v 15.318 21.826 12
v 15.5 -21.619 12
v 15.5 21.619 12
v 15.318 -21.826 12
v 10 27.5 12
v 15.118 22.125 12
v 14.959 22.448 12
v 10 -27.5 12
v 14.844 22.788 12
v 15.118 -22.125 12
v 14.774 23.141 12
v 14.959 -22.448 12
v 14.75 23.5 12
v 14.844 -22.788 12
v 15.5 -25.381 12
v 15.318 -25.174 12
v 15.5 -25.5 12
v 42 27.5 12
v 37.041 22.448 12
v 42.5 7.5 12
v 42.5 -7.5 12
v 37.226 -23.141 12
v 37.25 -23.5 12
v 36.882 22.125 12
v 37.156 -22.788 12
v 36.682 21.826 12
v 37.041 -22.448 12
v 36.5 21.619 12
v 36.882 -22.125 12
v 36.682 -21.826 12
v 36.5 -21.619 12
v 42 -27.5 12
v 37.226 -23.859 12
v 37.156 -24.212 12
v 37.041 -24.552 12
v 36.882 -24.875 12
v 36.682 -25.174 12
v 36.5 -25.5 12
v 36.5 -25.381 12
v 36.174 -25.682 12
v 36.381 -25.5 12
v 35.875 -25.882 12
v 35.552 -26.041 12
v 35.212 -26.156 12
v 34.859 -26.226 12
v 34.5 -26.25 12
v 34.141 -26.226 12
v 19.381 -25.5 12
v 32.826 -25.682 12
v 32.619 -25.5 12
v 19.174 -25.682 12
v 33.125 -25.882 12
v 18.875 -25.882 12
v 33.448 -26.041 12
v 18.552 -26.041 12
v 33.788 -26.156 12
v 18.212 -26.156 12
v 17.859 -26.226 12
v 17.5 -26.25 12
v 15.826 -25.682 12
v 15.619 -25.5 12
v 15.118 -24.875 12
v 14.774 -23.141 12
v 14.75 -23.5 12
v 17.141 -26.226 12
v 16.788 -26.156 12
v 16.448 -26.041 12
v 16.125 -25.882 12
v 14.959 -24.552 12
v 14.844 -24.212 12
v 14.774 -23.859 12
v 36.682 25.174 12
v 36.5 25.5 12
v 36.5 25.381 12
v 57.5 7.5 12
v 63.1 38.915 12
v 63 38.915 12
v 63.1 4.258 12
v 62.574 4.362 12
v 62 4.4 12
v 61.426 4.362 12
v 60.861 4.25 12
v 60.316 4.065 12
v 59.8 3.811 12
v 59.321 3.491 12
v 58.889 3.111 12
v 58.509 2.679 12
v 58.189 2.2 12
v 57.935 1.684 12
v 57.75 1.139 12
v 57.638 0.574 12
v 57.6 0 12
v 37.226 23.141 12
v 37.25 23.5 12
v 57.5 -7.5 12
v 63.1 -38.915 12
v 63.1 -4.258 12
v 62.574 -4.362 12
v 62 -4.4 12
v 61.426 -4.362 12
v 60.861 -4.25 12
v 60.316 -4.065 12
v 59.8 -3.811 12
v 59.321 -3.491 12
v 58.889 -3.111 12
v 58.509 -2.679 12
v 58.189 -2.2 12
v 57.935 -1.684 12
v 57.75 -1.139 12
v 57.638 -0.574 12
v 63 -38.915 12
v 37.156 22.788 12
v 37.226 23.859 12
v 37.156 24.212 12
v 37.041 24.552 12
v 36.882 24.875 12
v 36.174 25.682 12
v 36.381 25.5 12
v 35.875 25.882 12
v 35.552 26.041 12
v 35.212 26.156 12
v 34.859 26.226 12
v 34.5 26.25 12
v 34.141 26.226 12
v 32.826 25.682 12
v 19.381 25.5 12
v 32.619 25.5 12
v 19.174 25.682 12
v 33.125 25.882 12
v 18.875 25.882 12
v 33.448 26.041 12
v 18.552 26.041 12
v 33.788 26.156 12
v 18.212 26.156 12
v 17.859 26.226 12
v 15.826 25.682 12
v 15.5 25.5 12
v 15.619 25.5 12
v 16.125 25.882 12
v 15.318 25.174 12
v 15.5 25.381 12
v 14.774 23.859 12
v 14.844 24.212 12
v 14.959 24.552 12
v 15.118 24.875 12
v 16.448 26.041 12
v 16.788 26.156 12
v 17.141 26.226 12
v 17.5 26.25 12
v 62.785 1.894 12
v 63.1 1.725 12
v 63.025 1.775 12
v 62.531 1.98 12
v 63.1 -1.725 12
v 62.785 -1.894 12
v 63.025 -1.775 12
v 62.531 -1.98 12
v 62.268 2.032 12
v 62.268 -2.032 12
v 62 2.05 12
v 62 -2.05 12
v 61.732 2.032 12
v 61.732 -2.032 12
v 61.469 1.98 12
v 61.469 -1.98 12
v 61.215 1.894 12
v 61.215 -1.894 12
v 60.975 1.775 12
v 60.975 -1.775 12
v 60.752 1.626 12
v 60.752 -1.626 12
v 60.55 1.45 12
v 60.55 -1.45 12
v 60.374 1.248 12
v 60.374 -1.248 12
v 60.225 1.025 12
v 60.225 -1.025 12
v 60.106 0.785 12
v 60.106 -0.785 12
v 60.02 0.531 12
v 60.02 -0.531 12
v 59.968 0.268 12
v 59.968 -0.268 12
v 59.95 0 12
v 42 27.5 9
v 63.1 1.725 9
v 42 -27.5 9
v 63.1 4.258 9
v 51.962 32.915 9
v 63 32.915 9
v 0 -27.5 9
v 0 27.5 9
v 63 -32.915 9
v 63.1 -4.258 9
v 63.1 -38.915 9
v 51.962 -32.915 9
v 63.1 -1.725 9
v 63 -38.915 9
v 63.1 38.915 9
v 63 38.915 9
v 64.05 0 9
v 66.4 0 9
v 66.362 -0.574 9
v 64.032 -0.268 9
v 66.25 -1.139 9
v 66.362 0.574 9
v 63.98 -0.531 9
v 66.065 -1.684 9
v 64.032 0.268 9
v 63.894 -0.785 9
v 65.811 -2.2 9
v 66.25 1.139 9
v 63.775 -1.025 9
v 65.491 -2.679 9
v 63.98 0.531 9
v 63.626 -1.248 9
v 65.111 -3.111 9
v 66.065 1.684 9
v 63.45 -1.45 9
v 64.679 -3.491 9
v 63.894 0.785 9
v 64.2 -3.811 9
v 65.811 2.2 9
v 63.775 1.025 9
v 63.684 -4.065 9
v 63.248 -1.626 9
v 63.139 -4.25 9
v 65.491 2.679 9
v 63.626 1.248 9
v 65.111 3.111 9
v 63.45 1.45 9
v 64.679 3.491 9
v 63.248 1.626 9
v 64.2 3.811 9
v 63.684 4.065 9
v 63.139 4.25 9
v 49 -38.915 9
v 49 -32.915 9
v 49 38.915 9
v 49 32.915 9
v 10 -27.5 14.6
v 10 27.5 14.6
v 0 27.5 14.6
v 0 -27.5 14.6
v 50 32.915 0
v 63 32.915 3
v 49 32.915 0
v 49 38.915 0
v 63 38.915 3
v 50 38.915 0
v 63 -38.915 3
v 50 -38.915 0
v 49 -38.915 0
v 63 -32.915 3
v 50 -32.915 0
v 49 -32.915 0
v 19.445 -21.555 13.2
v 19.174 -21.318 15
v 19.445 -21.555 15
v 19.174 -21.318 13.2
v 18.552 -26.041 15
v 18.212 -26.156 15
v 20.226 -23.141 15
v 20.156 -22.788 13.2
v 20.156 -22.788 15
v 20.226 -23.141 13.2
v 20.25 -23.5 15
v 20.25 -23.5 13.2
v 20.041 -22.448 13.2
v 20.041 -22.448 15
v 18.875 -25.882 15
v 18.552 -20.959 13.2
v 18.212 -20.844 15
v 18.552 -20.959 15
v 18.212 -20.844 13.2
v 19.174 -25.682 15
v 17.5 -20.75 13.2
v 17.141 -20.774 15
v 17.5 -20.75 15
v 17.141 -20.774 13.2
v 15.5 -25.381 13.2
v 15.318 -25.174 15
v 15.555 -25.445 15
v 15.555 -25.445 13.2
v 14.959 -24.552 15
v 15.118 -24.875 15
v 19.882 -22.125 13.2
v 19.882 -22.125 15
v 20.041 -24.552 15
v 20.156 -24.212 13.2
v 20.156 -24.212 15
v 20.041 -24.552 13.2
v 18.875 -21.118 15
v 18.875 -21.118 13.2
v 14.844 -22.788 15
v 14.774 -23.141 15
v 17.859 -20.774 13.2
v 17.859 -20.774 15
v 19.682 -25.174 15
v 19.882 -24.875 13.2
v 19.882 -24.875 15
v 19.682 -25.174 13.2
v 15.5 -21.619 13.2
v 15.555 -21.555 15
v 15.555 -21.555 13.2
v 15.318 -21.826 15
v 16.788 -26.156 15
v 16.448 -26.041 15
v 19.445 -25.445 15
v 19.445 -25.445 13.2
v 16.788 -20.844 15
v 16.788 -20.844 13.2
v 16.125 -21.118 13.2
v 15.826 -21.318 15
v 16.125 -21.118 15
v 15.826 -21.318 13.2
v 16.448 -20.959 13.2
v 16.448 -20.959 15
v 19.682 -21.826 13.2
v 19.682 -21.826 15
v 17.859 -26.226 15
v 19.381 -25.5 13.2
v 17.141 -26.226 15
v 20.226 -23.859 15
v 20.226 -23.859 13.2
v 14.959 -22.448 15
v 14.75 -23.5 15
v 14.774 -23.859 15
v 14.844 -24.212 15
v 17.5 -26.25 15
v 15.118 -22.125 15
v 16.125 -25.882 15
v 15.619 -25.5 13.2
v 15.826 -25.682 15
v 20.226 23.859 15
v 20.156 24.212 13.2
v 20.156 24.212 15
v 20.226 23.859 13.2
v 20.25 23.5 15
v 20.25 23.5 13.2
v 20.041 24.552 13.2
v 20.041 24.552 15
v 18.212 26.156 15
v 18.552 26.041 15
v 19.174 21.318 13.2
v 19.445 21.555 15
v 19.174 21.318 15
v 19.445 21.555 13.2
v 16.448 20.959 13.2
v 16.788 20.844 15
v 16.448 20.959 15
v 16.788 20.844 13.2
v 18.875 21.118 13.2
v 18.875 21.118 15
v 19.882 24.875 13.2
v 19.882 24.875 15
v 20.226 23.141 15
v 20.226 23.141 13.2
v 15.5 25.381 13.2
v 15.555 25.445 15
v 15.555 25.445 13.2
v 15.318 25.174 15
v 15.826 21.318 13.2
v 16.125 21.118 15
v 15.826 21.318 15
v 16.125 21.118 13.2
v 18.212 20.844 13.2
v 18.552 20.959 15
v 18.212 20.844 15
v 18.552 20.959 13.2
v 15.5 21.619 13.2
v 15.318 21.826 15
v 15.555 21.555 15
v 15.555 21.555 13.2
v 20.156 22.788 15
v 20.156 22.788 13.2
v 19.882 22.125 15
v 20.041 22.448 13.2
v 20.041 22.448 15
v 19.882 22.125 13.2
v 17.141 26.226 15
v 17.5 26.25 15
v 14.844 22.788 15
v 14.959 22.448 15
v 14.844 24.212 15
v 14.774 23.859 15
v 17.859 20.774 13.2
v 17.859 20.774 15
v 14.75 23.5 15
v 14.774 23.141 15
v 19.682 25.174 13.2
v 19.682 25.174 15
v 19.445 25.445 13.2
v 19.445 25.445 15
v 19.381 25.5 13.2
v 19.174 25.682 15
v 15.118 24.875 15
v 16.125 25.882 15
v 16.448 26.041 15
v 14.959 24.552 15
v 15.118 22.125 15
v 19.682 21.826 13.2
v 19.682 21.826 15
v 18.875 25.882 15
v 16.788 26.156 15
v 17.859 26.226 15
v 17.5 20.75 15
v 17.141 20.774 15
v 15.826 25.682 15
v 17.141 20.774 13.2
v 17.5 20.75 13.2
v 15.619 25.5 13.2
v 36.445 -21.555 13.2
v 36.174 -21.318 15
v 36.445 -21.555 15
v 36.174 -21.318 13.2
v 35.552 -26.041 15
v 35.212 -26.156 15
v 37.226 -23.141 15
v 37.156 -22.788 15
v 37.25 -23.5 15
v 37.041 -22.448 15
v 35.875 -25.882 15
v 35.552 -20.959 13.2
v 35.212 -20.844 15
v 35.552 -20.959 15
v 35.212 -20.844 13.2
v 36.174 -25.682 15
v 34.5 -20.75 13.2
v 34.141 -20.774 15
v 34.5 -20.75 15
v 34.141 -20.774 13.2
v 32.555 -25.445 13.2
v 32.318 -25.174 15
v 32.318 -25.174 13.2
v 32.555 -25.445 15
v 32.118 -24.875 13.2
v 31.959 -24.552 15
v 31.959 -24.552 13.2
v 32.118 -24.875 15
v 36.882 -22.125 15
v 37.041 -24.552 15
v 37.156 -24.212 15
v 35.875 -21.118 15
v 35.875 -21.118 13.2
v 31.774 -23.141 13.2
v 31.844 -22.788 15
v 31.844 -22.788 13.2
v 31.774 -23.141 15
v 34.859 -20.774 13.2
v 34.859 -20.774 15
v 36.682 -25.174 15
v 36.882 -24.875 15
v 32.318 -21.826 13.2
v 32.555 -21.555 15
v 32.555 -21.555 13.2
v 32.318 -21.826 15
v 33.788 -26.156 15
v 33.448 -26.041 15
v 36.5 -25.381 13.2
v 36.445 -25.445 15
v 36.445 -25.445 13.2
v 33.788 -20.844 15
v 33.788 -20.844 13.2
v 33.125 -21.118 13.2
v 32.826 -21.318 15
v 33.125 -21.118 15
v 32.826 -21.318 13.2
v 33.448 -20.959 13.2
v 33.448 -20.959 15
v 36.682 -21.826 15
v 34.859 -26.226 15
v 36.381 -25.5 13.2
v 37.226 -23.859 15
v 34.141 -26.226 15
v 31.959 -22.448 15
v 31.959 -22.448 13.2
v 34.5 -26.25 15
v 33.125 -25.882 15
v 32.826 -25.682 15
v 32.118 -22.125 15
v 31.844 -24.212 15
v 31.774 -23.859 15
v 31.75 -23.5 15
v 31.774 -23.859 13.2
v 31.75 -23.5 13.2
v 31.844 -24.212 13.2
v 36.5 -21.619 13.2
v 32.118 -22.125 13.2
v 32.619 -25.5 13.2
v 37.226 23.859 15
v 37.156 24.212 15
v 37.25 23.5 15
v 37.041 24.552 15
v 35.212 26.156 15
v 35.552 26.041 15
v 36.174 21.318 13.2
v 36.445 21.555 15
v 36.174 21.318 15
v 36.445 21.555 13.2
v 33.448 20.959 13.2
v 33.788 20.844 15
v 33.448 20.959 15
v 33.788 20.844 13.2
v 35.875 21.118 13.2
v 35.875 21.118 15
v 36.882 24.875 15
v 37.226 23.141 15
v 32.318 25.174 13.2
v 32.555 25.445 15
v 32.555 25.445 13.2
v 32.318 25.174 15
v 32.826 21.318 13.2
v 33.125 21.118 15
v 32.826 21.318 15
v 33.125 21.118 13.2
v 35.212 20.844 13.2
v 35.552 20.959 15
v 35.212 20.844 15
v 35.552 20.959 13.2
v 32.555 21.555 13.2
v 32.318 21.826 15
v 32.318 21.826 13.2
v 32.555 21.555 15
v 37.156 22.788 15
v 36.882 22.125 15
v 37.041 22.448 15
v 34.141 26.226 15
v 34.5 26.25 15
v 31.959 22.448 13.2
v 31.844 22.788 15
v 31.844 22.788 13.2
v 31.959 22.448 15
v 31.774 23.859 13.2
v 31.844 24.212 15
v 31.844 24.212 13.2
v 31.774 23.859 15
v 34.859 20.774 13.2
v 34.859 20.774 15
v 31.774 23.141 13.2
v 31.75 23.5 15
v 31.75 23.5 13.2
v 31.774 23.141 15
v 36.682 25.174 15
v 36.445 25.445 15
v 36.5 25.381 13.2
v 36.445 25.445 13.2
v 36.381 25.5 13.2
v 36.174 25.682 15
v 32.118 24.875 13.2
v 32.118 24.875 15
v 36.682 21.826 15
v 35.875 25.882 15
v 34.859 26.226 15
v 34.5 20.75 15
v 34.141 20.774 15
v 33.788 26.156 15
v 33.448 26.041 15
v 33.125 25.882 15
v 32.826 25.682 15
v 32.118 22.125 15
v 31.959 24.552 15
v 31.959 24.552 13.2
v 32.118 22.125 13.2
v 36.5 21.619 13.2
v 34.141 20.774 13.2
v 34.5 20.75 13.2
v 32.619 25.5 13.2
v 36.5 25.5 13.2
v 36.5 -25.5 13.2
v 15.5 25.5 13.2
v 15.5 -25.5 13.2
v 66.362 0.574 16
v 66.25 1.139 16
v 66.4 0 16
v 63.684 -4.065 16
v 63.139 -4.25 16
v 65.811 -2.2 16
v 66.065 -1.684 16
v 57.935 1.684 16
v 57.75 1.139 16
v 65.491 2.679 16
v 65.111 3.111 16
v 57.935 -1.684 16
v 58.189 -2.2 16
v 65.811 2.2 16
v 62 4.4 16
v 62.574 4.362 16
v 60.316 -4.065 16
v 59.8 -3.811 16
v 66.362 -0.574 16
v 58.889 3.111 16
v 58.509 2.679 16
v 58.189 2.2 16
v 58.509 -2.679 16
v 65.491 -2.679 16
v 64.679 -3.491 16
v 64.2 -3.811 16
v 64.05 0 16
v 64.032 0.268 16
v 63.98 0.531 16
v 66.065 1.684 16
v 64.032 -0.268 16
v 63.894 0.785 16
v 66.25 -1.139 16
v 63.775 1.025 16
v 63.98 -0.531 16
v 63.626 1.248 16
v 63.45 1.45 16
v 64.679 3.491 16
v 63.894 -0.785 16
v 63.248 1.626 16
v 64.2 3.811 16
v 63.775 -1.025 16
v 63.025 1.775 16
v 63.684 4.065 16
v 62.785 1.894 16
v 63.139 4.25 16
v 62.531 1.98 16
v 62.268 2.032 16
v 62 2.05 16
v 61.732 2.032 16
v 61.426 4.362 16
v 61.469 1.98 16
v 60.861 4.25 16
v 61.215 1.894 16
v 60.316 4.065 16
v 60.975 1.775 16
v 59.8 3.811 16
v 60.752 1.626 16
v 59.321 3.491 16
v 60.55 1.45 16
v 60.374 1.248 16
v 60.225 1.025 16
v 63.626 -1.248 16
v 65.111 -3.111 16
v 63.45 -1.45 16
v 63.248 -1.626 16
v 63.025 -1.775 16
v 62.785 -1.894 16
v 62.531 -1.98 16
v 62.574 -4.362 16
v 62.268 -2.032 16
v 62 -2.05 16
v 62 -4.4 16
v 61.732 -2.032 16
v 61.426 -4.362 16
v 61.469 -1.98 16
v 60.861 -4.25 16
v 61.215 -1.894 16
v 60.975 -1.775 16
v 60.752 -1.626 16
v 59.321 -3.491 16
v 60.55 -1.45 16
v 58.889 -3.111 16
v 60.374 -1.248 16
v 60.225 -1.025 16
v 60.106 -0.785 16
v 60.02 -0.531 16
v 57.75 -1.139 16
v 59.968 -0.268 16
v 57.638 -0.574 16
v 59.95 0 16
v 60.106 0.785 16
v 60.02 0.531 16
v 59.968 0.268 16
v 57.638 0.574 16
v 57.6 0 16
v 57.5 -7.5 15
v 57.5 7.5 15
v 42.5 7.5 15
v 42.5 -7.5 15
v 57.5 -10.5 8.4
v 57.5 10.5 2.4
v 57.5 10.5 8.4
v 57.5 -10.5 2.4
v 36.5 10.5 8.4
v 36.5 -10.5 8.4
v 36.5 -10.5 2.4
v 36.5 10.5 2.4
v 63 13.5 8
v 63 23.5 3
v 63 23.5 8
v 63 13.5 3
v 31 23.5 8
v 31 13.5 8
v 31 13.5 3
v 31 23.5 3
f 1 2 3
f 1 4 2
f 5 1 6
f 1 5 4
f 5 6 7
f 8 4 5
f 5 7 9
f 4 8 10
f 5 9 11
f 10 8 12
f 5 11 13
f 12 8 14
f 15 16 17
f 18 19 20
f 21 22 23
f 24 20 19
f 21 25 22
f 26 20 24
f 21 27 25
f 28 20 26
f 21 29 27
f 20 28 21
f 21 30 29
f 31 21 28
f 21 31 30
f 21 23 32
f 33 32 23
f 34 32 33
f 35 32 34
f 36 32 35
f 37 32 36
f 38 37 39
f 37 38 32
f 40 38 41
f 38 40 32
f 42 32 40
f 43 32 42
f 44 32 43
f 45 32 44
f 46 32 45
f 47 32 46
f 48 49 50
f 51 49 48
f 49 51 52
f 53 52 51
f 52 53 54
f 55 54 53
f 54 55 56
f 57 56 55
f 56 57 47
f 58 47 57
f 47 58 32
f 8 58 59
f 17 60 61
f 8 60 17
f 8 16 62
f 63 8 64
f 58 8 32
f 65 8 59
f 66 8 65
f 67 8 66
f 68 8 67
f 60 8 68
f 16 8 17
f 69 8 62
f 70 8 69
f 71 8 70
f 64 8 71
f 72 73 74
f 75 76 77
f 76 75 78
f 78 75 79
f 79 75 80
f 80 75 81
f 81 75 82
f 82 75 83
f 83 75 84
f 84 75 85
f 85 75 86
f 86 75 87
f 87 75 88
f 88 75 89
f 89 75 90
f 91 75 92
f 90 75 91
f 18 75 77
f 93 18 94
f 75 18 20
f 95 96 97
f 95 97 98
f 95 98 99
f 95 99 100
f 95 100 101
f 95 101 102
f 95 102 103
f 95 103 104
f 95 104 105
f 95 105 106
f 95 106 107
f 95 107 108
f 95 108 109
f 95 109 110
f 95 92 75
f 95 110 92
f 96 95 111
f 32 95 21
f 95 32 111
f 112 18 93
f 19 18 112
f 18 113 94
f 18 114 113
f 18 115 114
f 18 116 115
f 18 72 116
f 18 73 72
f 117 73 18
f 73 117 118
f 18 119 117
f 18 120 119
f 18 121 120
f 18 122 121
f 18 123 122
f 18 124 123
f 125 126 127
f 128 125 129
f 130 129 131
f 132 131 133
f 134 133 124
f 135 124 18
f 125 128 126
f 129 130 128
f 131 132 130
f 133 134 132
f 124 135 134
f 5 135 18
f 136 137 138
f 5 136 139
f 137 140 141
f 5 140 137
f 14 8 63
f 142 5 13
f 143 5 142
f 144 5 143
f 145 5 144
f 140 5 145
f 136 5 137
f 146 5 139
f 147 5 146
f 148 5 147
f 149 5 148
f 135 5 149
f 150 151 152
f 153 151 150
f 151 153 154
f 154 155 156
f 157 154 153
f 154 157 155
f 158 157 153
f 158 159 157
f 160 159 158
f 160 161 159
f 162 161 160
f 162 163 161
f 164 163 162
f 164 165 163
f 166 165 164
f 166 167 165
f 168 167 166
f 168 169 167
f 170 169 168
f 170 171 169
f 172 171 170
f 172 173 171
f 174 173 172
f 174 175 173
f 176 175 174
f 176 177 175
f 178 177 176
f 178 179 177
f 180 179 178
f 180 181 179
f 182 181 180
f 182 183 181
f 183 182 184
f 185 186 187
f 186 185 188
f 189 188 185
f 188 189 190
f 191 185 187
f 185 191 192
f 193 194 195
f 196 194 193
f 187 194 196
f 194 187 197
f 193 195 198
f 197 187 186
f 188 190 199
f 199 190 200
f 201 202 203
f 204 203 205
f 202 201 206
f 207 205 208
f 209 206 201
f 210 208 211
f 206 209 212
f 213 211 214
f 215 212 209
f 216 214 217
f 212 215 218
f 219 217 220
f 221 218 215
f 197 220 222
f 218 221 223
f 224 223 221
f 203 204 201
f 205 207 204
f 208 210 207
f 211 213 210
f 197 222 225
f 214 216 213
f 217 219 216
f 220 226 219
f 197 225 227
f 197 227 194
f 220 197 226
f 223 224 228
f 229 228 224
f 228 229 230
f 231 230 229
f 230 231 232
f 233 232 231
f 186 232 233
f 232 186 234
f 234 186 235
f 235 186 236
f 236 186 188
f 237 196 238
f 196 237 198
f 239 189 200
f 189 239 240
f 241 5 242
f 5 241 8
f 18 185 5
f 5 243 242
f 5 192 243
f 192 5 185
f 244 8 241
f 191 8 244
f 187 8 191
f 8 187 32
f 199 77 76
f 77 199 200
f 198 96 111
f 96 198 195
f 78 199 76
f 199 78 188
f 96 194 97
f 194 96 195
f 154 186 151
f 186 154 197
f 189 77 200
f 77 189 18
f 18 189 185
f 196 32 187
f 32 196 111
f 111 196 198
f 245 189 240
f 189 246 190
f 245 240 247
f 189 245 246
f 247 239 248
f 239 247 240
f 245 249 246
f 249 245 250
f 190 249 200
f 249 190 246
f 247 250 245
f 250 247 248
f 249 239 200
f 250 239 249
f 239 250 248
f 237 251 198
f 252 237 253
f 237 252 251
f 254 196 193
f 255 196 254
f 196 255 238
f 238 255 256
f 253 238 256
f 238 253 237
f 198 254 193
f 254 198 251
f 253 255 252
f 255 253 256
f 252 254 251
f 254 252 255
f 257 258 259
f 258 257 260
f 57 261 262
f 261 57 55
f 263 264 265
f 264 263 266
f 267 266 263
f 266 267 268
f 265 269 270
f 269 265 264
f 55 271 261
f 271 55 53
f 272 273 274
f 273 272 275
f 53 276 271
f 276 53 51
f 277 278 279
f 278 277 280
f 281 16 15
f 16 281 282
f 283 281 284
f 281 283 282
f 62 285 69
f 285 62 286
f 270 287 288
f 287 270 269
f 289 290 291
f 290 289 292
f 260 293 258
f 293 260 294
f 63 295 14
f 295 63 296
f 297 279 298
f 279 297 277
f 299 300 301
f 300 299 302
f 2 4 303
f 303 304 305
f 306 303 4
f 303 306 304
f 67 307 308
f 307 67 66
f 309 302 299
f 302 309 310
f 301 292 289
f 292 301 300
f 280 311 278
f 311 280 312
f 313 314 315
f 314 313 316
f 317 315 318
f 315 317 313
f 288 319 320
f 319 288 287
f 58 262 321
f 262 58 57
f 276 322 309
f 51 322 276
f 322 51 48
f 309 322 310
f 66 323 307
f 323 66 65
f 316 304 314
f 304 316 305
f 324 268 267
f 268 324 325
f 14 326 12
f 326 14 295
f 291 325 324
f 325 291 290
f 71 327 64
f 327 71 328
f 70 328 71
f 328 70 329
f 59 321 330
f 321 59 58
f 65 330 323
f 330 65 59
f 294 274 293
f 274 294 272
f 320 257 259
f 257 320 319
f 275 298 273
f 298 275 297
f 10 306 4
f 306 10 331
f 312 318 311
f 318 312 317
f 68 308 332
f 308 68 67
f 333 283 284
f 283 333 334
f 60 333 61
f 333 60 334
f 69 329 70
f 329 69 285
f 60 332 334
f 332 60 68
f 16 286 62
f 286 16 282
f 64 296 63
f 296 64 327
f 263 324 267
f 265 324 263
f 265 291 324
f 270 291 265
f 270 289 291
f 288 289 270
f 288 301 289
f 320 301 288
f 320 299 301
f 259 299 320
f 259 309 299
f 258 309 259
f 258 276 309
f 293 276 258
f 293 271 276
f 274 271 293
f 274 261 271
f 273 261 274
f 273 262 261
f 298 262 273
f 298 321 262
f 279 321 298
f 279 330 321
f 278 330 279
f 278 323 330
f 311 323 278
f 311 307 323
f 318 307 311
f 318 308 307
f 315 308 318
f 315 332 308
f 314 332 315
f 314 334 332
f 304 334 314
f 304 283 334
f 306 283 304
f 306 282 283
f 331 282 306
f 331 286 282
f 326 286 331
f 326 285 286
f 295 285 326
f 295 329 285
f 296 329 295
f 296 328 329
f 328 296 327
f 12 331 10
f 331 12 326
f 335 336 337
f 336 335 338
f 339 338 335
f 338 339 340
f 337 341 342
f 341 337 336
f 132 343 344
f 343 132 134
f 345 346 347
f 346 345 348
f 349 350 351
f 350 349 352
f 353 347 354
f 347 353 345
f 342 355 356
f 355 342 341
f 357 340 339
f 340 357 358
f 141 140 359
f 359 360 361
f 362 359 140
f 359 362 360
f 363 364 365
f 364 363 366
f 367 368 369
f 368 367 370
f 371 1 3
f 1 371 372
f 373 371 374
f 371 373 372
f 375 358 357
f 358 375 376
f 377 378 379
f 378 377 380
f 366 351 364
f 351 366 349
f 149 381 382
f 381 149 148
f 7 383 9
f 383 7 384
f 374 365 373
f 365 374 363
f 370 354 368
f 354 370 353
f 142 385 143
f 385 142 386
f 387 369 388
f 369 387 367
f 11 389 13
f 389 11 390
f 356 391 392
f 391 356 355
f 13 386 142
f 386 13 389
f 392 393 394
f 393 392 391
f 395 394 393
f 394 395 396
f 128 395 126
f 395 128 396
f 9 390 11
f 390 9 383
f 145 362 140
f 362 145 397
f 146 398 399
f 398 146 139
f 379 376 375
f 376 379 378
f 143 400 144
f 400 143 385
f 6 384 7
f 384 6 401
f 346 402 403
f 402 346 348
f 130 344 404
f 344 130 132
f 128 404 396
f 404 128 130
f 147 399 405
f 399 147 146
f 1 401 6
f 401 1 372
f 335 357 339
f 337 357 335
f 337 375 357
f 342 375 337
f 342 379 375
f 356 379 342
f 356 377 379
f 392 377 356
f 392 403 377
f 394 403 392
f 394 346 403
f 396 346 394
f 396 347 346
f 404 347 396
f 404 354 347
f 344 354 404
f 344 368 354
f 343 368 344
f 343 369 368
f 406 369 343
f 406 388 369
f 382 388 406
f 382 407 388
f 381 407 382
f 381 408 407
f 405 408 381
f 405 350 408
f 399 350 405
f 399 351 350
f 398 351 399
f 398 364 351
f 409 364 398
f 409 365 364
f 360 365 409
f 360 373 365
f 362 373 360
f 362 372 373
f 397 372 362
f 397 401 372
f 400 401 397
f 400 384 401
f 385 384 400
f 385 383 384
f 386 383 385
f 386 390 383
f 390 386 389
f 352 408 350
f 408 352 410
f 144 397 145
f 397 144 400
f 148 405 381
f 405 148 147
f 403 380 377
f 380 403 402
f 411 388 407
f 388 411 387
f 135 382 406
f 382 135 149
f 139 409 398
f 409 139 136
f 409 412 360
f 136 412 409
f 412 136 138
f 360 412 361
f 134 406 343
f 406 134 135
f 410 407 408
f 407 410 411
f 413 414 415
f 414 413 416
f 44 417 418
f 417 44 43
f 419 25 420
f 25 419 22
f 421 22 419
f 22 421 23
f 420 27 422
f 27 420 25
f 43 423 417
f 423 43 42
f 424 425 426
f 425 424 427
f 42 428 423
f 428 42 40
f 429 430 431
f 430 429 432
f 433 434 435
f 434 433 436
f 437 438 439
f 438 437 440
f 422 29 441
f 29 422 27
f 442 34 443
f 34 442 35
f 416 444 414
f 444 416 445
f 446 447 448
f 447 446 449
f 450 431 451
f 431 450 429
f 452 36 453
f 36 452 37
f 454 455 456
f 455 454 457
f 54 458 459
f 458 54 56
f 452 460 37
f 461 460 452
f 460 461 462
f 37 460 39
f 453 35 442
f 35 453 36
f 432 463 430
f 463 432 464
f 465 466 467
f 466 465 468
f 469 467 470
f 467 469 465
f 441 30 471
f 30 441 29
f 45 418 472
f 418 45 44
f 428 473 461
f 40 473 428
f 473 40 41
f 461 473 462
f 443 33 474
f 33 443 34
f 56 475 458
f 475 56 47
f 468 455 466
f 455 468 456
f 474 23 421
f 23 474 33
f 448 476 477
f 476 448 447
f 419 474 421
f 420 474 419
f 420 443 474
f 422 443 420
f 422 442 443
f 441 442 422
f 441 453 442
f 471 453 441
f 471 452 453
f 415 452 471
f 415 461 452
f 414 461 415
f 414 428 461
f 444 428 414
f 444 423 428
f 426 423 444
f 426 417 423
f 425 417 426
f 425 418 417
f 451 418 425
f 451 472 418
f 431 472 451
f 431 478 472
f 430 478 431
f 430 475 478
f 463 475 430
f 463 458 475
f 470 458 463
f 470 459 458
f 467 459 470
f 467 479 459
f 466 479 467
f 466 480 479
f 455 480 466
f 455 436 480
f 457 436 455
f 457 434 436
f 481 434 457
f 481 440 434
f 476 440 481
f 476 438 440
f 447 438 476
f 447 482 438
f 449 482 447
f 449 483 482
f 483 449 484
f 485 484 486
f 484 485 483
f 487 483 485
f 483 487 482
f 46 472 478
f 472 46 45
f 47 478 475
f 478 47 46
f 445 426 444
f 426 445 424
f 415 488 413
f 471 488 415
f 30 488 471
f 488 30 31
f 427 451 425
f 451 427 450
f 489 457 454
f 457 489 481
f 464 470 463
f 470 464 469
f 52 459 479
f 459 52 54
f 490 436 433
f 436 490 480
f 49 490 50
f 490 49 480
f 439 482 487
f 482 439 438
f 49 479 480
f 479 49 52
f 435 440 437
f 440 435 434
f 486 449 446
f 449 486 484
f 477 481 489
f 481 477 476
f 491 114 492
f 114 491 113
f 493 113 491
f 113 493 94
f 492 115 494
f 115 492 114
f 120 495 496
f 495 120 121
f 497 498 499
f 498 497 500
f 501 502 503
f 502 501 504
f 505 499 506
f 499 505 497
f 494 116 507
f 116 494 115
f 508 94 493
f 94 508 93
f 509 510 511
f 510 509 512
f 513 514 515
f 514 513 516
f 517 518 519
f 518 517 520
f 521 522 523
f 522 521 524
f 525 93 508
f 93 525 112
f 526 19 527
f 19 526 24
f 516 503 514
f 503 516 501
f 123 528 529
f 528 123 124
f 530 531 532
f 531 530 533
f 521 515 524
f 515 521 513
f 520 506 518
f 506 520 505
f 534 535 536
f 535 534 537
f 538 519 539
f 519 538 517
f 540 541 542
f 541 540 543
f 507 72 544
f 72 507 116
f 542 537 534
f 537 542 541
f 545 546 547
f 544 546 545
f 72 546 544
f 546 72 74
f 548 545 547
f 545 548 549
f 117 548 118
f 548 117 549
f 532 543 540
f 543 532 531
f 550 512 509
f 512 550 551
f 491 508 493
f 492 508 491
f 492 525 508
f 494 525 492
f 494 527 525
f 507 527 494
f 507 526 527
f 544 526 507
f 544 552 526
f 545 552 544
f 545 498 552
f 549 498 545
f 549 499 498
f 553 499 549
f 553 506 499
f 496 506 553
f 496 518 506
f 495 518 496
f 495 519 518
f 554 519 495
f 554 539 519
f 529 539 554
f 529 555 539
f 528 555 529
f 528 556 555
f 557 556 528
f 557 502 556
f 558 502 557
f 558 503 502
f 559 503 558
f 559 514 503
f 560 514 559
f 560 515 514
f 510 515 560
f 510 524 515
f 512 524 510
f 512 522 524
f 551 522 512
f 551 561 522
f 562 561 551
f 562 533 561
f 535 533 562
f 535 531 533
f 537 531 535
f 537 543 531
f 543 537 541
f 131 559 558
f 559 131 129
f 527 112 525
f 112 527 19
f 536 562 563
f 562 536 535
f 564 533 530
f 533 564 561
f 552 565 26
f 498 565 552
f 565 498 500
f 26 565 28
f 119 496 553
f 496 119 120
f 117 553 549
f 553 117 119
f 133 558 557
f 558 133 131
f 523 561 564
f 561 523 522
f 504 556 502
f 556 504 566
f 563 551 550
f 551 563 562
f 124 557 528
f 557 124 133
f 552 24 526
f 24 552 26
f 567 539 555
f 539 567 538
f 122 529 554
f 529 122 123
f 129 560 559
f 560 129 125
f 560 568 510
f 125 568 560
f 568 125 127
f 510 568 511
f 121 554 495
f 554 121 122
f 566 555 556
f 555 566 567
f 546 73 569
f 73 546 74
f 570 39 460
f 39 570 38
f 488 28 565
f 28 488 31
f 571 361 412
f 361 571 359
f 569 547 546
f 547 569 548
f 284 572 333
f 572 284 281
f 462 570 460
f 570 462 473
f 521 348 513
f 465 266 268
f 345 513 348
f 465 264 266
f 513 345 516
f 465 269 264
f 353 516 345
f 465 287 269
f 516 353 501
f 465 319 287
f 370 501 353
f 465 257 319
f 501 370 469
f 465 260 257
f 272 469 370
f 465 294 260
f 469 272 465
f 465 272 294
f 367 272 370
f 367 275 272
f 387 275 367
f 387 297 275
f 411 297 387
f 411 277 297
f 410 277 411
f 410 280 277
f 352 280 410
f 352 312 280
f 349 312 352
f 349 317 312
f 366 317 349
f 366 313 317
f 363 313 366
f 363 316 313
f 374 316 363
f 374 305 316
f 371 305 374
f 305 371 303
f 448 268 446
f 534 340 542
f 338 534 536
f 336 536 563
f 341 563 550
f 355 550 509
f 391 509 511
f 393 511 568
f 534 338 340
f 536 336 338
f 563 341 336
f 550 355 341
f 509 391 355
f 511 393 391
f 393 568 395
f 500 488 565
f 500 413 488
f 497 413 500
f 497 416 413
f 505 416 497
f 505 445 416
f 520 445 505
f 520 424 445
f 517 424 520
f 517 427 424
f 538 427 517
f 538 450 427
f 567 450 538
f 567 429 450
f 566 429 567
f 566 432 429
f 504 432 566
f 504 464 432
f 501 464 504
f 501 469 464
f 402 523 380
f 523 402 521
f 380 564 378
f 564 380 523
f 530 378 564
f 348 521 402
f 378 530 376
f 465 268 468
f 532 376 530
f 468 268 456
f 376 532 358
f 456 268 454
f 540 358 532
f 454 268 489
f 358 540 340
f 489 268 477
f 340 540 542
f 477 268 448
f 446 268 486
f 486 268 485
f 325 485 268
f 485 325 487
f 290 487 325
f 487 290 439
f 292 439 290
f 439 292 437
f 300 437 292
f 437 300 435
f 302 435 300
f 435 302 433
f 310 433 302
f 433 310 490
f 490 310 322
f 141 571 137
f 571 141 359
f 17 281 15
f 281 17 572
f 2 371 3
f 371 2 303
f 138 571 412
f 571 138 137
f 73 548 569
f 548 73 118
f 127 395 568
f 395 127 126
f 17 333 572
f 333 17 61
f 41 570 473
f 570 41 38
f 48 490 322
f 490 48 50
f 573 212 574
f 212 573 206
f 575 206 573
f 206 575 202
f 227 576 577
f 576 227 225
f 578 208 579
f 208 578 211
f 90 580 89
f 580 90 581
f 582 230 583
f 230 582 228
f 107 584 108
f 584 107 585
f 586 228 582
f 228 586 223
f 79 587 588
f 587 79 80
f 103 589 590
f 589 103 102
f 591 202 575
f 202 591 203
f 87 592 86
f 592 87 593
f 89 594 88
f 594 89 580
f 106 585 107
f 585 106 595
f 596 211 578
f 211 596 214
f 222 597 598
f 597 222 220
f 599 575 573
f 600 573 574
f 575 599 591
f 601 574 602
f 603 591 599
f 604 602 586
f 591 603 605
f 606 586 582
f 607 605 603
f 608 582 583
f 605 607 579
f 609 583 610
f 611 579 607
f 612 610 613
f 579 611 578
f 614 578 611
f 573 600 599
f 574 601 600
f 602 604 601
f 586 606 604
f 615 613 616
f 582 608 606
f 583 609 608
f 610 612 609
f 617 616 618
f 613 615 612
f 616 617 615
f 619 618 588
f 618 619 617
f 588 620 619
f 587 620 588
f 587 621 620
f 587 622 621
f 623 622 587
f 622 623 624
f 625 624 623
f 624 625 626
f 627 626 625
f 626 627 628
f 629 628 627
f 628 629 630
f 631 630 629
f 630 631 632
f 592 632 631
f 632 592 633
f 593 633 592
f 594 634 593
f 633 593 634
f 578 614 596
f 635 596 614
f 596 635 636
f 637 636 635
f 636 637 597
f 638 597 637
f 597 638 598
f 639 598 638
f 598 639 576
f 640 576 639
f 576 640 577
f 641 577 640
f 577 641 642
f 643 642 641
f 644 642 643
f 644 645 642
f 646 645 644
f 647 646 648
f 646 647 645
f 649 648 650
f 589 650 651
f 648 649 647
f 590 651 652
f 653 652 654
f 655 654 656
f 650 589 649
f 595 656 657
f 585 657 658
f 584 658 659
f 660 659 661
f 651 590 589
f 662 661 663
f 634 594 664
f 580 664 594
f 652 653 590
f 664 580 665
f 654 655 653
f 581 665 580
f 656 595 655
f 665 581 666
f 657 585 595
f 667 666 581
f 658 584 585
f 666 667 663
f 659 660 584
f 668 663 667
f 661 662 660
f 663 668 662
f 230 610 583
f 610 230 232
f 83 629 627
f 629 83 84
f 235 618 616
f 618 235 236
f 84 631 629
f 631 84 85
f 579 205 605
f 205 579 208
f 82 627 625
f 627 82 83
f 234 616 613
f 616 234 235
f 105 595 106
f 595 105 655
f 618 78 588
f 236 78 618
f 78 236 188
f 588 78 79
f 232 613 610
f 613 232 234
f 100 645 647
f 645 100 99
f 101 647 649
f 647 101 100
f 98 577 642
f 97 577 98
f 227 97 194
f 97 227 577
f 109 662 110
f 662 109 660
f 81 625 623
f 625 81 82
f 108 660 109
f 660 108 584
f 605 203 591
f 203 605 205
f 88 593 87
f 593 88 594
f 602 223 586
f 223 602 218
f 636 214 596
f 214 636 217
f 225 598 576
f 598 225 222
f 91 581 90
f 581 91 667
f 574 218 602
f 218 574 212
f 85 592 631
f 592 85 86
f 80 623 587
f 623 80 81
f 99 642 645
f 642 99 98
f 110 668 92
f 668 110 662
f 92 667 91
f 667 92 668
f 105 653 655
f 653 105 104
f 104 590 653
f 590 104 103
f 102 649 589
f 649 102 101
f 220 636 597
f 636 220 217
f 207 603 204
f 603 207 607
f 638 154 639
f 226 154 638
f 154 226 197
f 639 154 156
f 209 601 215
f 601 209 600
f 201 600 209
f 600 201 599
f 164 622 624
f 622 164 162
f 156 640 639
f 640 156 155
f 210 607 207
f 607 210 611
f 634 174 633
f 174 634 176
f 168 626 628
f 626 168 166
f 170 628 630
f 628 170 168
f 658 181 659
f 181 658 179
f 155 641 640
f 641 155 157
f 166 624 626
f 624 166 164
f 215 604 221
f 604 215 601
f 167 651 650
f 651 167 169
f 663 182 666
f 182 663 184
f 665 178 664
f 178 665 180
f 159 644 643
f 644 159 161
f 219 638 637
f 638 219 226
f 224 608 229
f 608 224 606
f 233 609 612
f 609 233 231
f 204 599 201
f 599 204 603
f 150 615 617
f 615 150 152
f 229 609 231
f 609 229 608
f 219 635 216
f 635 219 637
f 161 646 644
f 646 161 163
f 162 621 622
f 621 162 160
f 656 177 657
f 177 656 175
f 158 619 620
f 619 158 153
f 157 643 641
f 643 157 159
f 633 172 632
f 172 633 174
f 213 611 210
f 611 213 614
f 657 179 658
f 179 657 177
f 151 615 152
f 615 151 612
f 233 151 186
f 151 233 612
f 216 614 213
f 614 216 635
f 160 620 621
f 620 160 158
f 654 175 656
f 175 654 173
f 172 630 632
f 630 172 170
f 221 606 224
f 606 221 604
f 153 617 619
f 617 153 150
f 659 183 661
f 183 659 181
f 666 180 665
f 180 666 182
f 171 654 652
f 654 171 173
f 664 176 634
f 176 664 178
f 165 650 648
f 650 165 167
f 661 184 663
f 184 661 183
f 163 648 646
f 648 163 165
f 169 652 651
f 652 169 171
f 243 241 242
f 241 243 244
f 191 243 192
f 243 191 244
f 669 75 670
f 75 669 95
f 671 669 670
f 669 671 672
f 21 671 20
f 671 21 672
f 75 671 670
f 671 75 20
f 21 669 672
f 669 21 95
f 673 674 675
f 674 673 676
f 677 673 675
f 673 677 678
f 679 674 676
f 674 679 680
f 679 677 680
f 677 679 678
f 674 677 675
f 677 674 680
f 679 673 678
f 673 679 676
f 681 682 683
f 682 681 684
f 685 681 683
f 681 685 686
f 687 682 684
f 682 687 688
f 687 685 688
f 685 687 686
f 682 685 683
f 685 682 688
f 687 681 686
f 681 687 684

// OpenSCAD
// ======================================================================
// Slot Car Track Mapper — Front Sensor Fixture (parametric, first pass)
//
// Donor chassis: Scaleauto HS-124, plastic, sidewinder, variable
// wheelbase 96-114mm. See ../DESIGN.md §7 for the full mechanical plan
// and reasoning behind every decision referenced below.
//
// Cut the donor chassis at its molded score line ("the V") in front of
// the motor box. The rear motor/drive section is kept stock and is NOT
// modeled here. This part REPLACES the front section: it splices onto
// the rear stub, carries the guide flag, the Pico 2 W, the PMW3360, the
// ICM-42688-P, and the IR reflectance lap sensor, and rides on a
// two-point skid instead of the stock front wheels.
//
// Units: mm. X=0 at the rear cut face, +X toward the front/guide flag.
// Y=0 on the car's centerline. Z=0 at the track surface.
//
// ---------------------------------------------------------------------
// STATUS: second pass. All donor-chassis dimensions below are now from
// calipers on the real part (not photo estimates). Still NOT print-ready:
// the component footprints (Pico/PMW3360/ICM-42688-P/IR module) are still
// typical/placeholder values — verify those against the actual parts
// bought before printing, and the rear_splice() joint is still a
// placeholder lap joint pending the real spine cross-section/rib profile.
// ======================================================================

// ---- MEASURED on the physical chassis (trust these) -------------------
wheelbase           = 114.25;
front_track_width   = 77.83;  // outside-to-outside, stock front wheels
rear_track_width    = 80.72;  // outside-to-outside, stock rear wheels (kept stock — informational only)
spine_width         = 55.0;   // width of the main chassis spine at the cut
cut_to_front_axle   = 47.0;   // V score-line to (former) front axle centerline
front_axle_to_guide = 18.0;   // front axle centerline to guide-flag tip
spine_thickness     = 3.6;    // stock spine plastic thickness at the cut face
guide_peg_dia       = 3.8;    // stock guide-flag pivot peg diameter
guide_peg_depth     = 7.0;    // stock guide-flag pivot peg engagement depth

// ---- Still estimated/typical — nothing left here as of the latest caliper pass,
// keep this section for whatever gets re-estimated later. ---------------

total_length = cut_to_front_axle + front_axle_to_guide;
// NOTE: the real total_length (65mm) is barely half of the ~112mm first-pass
// guess. That's tight — the Pico 2 W's 51mm length alone eats most of it if
// mounted lengthwise, which is why it's mounted ROTATED 90° below (across
// the deck's width instead of along its length).

// Lever arm from the guide-pin pivot (DESIGN.md §2) to wherever the
// optical sensor actually ends up — feed this into the fusion loop's
// lever-arm correction once it's finalized here.
pmw_x = total_length - 18;
lever_arm_r = total_length - pmw_x;

// ---- Component footprints — VERIFY against the specific parts bought --
pico_l = 51; pico_w = 21;                                  // Pico 2 W board outline
pico_hole_dx = 47; pico_hole_dy = 17; pico_hole_d = 2.5;    // mount-hole pattern (+ clearance)

pmw_l = 21; pmw_w = 21; pmw_module_h = 6;                  // PMW3360 breakout, typical (PCB+lens)
pmw_focus_height = 2.4;                                     // lens-to-surface distance, typical — shim to tune

icm_l = 15; icm_w = 15; icm_t = 3;                         // ICM-42688-P breakout, typical

ir_l = 32; ir_w = 10; ir_module_h = 5;                     // TCRT5000-style reflectance module, typical
ir_focus_height = 3.0;                                      // typical optimal sensing distance — verify vs. datasheet

// ---- Fixture structural parameters -------------------------------------
deck_t    = 3;    // main deck thickness
skid_h    = 9;    // ground clearance: track surface to underside of deck
skid_w    = 6;    // each skid pad's width (Y)
skid_len  = 14;   // each skid pad's length (X) — shrunk to fit the real (shorter) total_length
ski_tip_r = 3;    // radius rounding the skid's leading edge, so it bridges track-piece seams

standoff_pmw = skid_h - pmw_focus_height - pmw_module_h;
standoff_ir  = skid_h - ir_focus_height  - ir_module_h;

echo(str("total_length = ", total_length, " mm"));
echo(str("lever_arm_r (guide pivot to PMW3360) = ", lever_arm_r, " mm"));
echo(str("pmw standoff spacer needed = ", standoff_pmw, " mm ", standoff_pmw < 0 ? "*** NEGATIVE — increase skid_h or use a thinner module ***" : "(OK)"));
echo(str("ir standoff spacer needed = ", standoff_ir, " mm ", standoff_ir < 0 ? "*** NEGATIVE — increase skid_h or use a thinner module ***" : "(OK)"));

$fn = 48;

flare_start = 42;          // X where the deck begins widening from the spine to the skid track width
deck_front  = total_length - 2;  // X of the deck's front edge, almost at the guide-flag tip
splice_len  = 10;          // rear_splice overlap length — shrunk to fit the real (shorter) total_length

echo(str("usable length rear of the flare (splice + Pico zone) = ", flare_start - splice_len, " mm — Pico 2 W needs at least its short-axis dimension here since it's mounted rotated"));

module deck() {
    // Constant-width rear section at the spine width (mates with the
    // rear splice), then flares out to front_track_width so the skids
    // (placed at the stock front track width for roll stability, DESIGN.md
    // §7) actually land on structure instead of floating past the edge of
    // a 55mm-wide deck — the same reason the stock chassis needs separate
    // lateral arms to reach its wheels from the narrow spine.
    translate([10, -spine_width/2, skid_h])
        cube([flare_start - 10, spine_width, deck_t]);
    hull() {
        translate([flare_start, -spine_width/2, skid_h])
            cube([0.1, spine_width, deck_t]);
        translate([deck_front, -front_track_width/2, skid_h])
            cube([0.1, front_track_width, deck_t]);
    }
}

module rear_splice() {
    // Overlap tab that mates with the stock spine stub left on the rear
    // (motor/drive) section after the cut. Placeholder lap joint —
    // measure the real stub's thickness/rib profile and redesign this
    // as a proper tongue-and-groove or screwed lap joint.
    translate([0, -spine_width/2, skid_h])
        cube([splice_len, spine_width, spine_thickness + 2]);
}

module skid_pad(y_offset) {
    // Ski shape: full skid_h at the trailing edge, tapering so the
    // BOTTOM lifts upward toward the leading (high-X) edge — like a ski
    // tip — while the top stays level. Bridges track-piece seams instead
    // of catching on them.
    x0 = deck_front - skid_len;
    x1 = deck_front;
    translate([0, y_offset - skid_w/2, 0])
        hull() {
            translate([x0, 0, 0])
                cube([1, skid_w, skid_h]);
            translate([x1 - 1, 0, skid_h - ski_tip_r*2])
                cube([1, skid_w, ski_tip_r*2]);
        }
}

module skids() {
    y = (front_track_width - skid_w) / 2;
    skid_pad(y);
    skid_pad(-y);
}

module pico_mount() {
    // Pico 2 W sits on TOP of the deck, ROTATED 90° so its 51mm long axis
    // runs ACROSS the deck (Y) instead of along it (X) — the real
    // total_length (65mm) is too short to fit the board lengthwise once
    // the rear splice and front sensor/guide-flag cluster take their
    // share. This costs Y-margin instead (51mm board in a 55mm-wide
    // spine — only ~2mm clearance each side, snug but workable for a
    // first pass; revisit if the real board+header footprint needs more).
    px = (splice_len + flare_start) / 2;
    translate([px - pico_w/2, -pico_l/2, skid_h + deck_t])
        color("ForestGreen") cube([pico_w, pico_l, 1.2]);
    for (xs = [-1, 1], ys = [-1, 1])
        translate([px + xs*pico_hole_dy/2, ys*pico_hole_dx/2, skid_h])
            cylinder(d = pico_hole_d + 3, h = deck_t + 3);
}

module icm_mount() {
    // ICM-42688-P sits on top of the deck, in the flare zone where there's
    // width to spare beside the (now sideways) Pico. Orientation matters
    // for the fusion loop (DESIGN.md §6) — align its axes to chassis
    // forward/lateral/vertical when it's actually placed.
    px = flare_start + 8;
    translate([px - icm_l/2, -icm_w/2, skid_h + deck_t])
        color("Orange") cube([icm_l, icm_w, icm_t]);
}

module pmw_mount() {
    // PMW3360 hangs below the deck, lens facing down, as close to the
    // guide-pin pivot as the guide-flag mount allows (DESIGN.md §2 —
    // minimizes the lever-arm correction term). Standoff height sets
    // the focus distance; shim to tune once assembled.
    translate([pmw_x - pmw_l/2, -pmw_w/2, skid_h - standoff_pmw - pmw_module_h])
        color("RoyalBlue") cube([pmw_l, pmw_w, pmw_module_h]);
}

module ir_mount() {
    // IR reflectance lap sensor, alongside the PMW3360, same standoff logic.
    py = pmw_w/2 + ir_w/2 + 3;
    translate([pmw_x - ir_l/2, py - ir_w/2, skid_h - standoff_ir - ir_module_h])
        color("Crimson") cube([ir_l, ir_w, ir_module_h]);
}

module guide_flag_mount() {
    // Placeholder socket for the stock guide-flag pivot peg — MUST
    // preserve the peg's free pivot (DESIGN.md §7); do not glue solid.
    // guide_peg_depth (7mm) is deeper than deck_t (3mm) alone, so this is
    // a raised boss standing on the deck, not just a hole bored into it.
    boss_d = guide_peg_dia + 5;
    translate([deck_front - 1, 0, skid_h])
        difference() {
            cylinder(d = boss_d, h = guide_peg_depth);
            translate([0, 0, -0.1])
                cylinder(d = guide_peg_dia + 0.3, h = guide_peg_depth + 0.2);
        }
}

union() {
    color("LightGray") deck();
    color("DimGray") rear_splice();
    color("Black") skids();
    pico_mount();
    icm_mount();
    pmw_mount();
    ir_mount();
    color("Silver") guide_flag_mount();
}
